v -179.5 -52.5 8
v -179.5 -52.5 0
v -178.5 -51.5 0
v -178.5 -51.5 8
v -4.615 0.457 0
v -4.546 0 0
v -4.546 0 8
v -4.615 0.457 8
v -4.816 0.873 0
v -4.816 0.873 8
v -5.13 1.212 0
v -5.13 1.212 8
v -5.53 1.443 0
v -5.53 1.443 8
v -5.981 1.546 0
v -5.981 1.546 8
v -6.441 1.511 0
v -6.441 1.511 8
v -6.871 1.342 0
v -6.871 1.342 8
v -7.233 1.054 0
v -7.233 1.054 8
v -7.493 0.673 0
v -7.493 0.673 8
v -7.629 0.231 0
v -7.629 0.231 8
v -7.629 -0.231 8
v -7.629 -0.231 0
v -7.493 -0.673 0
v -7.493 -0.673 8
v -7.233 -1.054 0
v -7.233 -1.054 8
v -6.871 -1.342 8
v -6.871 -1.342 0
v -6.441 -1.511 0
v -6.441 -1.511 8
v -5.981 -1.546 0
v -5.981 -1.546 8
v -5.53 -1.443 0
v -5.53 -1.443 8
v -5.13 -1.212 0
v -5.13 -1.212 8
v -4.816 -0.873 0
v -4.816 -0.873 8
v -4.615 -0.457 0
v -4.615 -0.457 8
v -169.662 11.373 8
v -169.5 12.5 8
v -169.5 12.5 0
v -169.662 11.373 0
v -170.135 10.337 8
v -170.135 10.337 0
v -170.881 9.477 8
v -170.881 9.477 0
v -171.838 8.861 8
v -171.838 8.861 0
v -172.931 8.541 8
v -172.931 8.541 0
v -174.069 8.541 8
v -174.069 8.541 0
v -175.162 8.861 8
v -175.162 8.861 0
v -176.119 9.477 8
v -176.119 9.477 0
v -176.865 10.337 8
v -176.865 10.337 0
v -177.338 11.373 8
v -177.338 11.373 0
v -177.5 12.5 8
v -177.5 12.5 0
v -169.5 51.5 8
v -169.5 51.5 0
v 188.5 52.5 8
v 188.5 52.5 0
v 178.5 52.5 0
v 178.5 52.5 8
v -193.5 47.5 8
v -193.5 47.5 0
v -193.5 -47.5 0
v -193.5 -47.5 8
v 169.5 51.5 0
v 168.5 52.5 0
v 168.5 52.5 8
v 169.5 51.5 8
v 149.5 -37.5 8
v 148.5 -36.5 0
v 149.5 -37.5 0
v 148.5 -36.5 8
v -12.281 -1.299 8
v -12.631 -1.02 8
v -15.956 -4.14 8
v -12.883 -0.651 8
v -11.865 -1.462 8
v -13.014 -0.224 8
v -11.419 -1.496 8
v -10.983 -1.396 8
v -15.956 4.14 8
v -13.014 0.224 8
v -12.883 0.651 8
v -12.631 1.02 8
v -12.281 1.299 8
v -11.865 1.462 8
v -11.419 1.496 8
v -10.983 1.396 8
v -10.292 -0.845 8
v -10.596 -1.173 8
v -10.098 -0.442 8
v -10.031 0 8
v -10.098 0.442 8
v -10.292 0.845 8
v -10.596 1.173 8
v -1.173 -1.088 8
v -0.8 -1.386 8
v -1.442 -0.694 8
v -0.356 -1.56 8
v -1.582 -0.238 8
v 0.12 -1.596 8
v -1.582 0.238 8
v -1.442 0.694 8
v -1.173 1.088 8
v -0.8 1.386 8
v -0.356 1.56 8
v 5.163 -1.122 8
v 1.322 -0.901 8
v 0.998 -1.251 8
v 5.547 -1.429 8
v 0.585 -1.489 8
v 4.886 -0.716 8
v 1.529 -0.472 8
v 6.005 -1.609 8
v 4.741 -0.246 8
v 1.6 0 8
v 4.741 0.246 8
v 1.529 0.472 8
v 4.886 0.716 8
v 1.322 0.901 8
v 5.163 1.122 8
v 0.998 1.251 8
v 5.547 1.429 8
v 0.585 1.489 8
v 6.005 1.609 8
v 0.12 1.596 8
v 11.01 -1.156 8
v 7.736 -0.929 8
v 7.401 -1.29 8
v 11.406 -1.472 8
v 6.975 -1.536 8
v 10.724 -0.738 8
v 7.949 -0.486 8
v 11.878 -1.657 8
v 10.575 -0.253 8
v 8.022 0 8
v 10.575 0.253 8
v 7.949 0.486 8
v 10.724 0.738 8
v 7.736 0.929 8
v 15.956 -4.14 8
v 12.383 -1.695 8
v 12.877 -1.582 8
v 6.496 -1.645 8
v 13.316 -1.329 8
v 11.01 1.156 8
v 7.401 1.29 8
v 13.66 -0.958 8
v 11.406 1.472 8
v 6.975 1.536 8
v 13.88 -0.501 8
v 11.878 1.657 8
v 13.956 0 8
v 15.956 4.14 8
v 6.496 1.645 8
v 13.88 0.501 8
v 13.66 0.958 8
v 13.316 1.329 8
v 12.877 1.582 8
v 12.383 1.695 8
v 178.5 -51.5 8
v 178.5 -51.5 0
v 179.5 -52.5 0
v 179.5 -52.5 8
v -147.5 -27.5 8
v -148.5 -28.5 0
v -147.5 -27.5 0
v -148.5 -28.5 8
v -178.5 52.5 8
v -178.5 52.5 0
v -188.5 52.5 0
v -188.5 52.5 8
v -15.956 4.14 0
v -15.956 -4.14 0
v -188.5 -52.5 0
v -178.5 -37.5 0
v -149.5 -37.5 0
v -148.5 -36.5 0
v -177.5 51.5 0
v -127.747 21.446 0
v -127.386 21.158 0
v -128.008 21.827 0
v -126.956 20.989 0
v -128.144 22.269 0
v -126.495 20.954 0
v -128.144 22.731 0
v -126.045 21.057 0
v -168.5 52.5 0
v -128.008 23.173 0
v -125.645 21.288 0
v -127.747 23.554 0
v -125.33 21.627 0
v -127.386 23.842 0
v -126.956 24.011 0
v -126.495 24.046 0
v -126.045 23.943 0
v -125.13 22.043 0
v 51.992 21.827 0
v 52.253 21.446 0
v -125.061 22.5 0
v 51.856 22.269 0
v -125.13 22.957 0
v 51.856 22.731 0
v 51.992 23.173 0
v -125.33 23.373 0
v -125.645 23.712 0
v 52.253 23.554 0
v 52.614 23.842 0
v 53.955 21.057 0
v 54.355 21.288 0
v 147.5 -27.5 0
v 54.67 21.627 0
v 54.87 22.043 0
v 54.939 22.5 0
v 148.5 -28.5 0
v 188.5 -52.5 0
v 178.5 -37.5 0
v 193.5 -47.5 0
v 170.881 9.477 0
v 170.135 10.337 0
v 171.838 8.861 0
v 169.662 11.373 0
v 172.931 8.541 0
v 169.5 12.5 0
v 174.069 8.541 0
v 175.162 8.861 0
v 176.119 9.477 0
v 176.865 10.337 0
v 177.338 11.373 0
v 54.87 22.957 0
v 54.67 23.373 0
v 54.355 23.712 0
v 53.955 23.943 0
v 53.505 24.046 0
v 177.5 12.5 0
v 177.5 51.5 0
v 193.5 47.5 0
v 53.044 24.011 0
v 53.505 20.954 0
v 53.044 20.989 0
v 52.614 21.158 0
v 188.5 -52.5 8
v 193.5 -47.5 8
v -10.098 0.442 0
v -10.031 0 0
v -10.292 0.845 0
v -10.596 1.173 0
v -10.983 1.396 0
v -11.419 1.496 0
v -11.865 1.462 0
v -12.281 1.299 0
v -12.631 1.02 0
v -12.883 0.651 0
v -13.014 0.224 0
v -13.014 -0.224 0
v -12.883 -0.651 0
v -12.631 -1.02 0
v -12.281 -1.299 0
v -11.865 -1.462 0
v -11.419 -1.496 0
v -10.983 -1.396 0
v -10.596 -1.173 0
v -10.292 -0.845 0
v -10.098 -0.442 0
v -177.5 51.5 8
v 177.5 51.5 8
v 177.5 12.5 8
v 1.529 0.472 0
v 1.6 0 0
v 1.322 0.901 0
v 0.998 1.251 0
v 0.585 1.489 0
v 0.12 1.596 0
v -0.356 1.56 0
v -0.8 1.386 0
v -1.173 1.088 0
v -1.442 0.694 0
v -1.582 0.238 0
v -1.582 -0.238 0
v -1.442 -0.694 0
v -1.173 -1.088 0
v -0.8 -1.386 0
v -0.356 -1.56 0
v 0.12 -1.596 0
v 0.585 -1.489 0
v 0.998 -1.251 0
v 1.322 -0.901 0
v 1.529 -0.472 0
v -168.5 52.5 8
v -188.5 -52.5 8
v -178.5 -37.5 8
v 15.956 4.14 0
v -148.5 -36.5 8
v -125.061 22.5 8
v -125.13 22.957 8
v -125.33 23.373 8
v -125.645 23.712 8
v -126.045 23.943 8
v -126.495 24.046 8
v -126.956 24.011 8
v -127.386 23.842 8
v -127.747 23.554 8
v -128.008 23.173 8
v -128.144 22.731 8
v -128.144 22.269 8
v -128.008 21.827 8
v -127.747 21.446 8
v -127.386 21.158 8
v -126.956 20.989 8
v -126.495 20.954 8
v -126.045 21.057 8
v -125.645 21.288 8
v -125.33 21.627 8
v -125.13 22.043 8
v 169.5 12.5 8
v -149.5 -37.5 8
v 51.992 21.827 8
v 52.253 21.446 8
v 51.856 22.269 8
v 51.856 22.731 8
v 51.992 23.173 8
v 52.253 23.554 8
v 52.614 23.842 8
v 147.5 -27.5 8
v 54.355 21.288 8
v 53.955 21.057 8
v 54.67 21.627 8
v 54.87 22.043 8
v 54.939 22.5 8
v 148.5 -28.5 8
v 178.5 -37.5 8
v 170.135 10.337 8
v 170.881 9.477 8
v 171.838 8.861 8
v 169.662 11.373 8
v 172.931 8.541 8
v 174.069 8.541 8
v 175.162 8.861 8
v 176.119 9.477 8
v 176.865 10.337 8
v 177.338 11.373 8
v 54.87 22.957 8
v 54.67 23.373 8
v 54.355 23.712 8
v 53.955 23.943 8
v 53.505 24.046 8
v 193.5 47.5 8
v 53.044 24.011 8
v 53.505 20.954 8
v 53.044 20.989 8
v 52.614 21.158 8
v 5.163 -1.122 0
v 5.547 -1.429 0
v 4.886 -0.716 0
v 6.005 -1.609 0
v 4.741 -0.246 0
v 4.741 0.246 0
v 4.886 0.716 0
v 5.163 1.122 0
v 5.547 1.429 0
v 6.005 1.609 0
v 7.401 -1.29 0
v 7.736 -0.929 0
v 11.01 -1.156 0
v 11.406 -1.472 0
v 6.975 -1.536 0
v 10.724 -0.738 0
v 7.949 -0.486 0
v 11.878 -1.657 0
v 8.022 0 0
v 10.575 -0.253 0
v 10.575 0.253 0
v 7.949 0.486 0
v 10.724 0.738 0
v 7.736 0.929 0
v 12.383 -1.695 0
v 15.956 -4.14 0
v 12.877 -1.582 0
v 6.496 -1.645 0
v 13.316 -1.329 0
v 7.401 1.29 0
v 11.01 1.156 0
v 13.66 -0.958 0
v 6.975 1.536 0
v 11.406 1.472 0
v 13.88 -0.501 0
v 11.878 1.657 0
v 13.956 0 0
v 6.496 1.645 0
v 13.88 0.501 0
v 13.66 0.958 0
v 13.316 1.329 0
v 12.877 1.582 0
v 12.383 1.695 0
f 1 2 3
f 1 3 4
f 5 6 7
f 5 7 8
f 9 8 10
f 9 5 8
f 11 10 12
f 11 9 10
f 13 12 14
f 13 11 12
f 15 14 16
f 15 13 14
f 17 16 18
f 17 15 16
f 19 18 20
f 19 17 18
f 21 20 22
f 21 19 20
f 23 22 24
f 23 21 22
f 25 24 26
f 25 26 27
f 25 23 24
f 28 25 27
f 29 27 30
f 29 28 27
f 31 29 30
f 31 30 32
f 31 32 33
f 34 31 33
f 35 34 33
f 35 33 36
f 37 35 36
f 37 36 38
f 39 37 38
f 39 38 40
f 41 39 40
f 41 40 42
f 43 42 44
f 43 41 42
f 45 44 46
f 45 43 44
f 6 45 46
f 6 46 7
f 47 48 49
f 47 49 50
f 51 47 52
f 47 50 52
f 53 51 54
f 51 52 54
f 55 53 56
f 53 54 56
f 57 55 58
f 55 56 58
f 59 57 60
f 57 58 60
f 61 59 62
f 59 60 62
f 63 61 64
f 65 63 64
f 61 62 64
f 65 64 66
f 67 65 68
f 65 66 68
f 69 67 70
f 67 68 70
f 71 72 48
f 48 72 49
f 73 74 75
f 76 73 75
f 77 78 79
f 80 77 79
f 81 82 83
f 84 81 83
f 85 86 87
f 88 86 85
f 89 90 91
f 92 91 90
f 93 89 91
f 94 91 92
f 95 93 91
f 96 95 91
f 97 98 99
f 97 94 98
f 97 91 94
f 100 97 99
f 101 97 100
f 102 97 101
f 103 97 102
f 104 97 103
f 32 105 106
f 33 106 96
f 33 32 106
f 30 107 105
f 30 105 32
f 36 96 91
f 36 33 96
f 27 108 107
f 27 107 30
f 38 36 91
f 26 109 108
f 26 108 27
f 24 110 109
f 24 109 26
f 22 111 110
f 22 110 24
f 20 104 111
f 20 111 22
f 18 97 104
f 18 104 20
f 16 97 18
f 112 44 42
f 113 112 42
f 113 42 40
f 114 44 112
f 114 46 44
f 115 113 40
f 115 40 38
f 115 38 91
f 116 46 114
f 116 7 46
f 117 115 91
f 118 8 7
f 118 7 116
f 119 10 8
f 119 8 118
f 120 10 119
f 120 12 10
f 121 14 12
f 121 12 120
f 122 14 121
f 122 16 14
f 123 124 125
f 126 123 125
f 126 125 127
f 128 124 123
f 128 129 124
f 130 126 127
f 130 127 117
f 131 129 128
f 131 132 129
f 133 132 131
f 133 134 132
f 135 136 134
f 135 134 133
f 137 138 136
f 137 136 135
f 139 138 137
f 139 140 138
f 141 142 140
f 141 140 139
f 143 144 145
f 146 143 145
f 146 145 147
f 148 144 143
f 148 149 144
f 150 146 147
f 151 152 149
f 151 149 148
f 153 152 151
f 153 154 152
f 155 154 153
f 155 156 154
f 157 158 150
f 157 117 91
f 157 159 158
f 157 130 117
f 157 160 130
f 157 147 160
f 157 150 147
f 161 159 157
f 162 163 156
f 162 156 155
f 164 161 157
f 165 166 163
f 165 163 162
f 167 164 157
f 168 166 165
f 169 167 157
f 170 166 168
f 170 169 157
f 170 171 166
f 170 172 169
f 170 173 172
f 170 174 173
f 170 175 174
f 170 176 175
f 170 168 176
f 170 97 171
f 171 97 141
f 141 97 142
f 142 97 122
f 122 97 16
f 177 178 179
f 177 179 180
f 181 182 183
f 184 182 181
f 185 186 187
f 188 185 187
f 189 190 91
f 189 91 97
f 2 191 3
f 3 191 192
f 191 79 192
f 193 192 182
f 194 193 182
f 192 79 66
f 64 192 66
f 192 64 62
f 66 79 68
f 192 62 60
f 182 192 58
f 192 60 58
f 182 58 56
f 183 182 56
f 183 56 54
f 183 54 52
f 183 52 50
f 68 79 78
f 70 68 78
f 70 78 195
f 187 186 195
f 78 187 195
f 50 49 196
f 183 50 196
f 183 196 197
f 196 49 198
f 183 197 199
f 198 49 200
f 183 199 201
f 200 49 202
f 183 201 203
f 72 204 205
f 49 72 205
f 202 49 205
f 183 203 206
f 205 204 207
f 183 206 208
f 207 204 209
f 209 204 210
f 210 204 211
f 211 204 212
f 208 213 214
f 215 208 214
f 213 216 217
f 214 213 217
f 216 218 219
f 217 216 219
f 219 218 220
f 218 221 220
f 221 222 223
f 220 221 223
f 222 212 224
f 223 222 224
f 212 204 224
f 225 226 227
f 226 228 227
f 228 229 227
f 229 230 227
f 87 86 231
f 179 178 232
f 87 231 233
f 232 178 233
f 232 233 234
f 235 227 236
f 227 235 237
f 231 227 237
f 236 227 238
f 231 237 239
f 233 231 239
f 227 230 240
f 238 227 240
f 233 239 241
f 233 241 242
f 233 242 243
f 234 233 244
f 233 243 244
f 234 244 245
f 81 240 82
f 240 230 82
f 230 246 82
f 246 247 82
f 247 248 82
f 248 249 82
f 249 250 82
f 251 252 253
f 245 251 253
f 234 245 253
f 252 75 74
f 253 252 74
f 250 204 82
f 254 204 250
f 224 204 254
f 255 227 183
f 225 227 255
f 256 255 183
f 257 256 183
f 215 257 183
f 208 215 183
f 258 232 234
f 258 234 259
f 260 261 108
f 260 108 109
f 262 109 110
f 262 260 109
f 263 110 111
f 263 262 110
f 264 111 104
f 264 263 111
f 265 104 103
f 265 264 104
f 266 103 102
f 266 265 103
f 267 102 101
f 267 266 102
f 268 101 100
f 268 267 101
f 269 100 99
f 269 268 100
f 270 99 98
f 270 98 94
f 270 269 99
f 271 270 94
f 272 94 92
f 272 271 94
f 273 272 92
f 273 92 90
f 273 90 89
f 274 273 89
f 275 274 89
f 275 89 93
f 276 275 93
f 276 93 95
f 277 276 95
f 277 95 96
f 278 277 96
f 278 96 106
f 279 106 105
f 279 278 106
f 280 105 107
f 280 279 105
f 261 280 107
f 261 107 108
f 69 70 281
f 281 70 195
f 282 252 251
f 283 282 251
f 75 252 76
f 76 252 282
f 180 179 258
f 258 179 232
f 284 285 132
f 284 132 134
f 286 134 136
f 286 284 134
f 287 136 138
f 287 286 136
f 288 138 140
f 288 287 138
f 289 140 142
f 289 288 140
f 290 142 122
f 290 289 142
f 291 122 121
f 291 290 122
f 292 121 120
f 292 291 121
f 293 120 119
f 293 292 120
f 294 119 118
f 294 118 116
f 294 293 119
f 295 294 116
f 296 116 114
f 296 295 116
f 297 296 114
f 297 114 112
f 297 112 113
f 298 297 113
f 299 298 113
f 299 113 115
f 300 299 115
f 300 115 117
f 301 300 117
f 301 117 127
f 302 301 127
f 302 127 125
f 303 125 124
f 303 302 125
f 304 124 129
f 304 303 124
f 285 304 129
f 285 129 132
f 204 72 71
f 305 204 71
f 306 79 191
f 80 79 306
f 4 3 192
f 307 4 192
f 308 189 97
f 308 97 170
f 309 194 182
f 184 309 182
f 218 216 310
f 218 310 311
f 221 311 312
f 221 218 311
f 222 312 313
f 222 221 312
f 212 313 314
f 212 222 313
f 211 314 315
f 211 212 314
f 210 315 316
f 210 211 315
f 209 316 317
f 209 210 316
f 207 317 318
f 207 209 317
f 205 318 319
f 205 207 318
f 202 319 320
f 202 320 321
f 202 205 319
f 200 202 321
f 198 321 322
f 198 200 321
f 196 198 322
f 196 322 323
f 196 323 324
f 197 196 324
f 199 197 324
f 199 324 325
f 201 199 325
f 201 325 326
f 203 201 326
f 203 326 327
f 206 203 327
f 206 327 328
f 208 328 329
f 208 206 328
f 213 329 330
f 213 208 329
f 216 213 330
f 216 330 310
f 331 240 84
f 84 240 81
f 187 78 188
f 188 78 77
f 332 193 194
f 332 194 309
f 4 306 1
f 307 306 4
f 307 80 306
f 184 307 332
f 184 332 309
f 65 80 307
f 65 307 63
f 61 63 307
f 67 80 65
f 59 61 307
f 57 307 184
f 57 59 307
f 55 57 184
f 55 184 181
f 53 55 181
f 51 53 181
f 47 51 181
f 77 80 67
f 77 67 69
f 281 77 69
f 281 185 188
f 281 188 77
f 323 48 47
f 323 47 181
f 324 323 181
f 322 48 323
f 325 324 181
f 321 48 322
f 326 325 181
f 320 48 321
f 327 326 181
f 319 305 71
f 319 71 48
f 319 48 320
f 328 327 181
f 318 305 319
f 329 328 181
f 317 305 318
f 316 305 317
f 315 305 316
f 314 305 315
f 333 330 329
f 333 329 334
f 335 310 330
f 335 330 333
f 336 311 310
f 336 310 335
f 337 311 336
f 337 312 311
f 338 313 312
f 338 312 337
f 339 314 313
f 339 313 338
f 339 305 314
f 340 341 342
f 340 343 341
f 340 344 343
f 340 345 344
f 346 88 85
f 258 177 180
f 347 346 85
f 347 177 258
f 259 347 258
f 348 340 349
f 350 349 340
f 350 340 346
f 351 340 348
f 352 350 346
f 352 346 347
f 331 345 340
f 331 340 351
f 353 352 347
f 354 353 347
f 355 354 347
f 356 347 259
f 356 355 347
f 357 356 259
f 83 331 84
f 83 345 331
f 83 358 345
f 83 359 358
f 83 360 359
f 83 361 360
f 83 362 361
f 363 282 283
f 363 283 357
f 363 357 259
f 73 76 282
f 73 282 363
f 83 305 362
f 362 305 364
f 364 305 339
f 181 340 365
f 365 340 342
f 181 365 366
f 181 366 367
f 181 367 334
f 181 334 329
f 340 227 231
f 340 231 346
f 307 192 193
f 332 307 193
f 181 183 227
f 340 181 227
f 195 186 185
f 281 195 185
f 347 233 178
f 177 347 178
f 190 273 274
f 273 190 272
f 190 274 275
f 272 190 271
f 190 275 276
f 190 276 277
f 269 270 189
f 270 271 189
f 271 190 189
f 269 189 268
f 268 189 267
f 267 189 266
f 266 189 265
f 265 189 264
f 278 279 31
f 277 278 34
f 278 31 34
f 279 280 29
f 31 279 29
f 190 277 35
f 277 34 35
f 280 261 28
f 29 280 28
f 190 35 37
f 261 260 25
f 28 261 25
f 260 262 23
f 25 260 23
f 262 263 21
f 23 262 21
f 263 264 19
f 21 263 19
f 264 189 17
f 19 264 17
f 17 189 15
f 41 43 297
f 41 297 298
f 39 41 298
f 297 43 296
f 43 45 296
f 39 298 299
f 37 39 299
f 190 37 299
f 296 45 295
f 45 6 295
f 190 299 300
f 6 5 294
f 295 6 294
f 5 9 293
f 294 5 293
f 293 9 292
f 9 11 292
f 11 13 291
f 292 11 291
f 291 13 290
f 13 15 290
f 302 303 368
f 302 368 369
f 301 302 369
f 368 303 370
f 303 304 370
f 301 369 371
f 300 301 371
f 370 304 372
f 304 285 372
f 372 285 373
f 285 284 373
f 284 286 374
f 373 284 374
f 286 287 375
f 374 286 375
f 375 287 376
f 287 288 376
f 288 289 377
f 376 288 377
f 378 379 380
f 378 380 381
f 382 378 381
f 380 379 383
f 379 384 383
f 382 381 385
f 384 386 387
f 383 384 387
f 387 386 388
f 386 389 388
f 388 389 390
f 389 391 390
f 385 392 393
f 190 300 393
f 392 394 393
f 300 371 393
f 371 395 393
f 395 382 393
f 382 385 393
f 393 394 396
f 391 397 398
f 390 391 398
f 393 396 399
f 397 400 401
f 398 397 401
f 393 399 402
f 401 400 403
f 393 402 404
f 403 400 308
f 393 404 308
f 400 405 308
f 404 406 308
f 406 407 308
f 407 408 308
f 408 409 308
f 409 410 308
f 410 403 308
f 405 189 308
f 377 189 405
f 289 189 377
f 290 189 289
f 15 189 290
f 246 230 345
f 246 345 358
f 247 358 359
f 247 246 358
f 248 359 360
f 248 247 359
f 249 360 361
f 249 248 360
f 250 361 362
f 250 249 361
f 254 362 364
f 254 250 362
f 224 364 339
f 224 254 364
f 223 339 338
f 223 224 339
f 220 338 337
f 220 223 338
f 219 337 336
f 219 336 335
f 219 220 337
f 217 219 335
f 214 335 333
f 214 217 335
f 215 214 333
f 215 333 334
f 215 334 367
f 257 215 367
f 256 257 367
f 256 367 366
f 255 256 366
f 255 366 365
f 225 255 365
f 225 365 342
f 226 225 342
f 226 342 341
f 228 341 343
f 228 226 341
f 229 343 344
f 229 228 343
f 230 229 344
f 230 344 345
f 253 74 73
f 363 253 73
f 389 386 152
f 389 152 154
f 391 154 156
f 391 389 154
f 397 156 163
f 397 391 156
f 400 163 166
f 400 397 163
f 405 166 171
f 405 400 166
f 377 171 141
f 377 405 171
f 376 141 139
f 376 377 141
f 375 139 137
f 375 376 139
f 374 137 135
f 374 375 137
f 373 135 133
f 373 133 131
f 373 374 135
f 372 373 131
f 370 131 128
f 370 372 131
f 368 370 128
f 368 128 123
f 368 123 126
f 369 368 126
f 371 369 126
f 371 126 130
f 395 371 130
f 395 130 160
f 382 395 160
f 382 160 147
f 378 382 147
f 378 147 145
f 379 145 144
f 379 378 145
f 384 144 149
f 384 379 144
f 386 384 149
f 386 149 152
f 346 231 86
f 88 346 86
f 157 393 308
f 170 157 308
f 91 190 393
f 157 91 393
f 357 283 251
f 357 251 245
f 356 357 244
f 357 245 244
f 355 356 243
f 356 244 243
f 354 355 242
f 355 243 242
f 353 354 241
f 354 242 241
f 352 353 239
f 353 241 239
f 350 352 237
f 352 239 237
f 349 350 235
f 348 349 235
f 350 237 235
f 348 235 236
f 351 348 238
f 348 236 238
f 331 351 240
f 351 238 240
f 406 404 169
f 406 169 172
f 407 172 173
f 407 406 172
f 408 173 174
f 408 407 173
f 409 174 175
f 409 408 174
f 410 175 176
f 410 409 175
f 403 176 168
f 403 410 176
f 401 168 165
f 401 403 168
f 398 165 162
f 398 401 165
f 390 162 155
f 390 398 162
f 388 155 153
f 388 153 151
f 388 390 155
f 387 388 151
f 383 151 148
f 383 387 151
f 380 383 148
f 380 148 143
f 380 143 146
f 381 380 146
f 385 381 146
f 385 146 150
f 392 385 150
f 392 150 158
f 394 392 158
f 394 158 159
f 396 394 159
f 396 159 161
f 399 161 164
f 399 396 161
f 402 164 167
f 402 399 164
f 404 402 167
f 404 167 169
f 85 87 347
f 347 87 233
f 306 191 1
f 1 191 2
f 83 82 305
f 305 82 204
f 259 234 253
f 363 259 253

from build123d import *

# Parameters (mm, degrees)
F0_R     = 1.55
F1_DEPTH = 8
F2_SIZE  = 5
F3_W     = 31.912242
F3_H     = 8.279254
F3_R     = 1.5
F3_R_2   = 1.55
F3_R_3   = 1.6
F3_R_4   = 1.65
F3_R_5   = 1.7
F4_DEPTH = 8
F5_SIZE  = 1


with BuildPart() as f1:
    # F0 (on Top) → F1 (new body)
    with BuildSketch(Plane.XY):
        with BuildLine():
            Line((193.5, -52.5), (193.5, 52.5))
            Line((193.5, 52.5), (177.5, 52.5))
            Line((177.5, 52.5), (177.5, 12.5))
            ThreePointArc((177.5, 12.5), (173.5, 8.5), (169.5, 12.5))
            Line((169.5, 12.5), (169.5, 52.5))
            Line((169.5, 52.5), (-169.5, 52.5))
            Line((-169.5, 52.5), (-169.5, 12.5))
            ThreePointArc((-169.5, 12.5), (-173.5, 8.5), (-177.5, 12.5))
            Line((-177.5, 12.5), (-177.5, 52.5))
            Line((-177.5, 52.5), (-193.5, 52.5))
            Line((-193.5, 52.5), (-193.5, -52.5))
            Line((-193.5, -52.5), (-178.5, -52.5))
            Line((-178.5, -52.5), (-178.5, -37.5))
            Line((-178.5, -37.5), (-148.5, -37.5))
            Line((-148.5, -37.5), (-148.5, -27.5))
            Line((-148.5, -27.5), (148.5, -27.5))
            Line((148.5, -27.5), (148.5, -37.5))
            Line((148.5, -37.5), (178.5, -37.5))
            Line((178.5, -37.5), (178.5, -52.5))
            Line((178.5, -52.5), (193.5, -52.5))
        make_face()
        with Locations((-126.611084, 22.5)):
            Circle(F0_R, mode=Mode.SUBTRACT)
        with Locations((53.388916, 22.5)):
            Circle(F0_R, mode=Mode.SUBTRACT)
    extrude(amount=F1_DEPTH)

    # F2
    f2_edges = [f1.edges().sort_by_distance(p)[0] for p in [
        (-193.5, 52.5, 4),
        (-193.5, -52.5, 4),
        (193.5, -52.5, 4),
        (193.5, 52.5, 4),
    ]]
    chamfer(f2_edges, length=F2_SIZE)

    # F5
    f5_edges = [f1.edges().sort_by_distance(p)[0] for p in [
        (-178.5, -52.5, 4),
        (178.5, -52.5, 4),
        (177.5, 52.5, 4),
        (169.5, 52.5, 4),
        (-177.5, 52.5, 4),
        (-169.5, 52.5, 4),
        (-148.5, -27.5, 4),
        (148.5, -27.5, 4),
        (148.5, -37.5, 4),
        (-148.5, -37.5, 4),
    ]]
    chamfer(f5_edges, length=F5_SIZE)


with BuildPart() as f4:
    # F3 (on Top) → F4 (new body)
    with BuildSketch(Plane.XY):
        Rectangle(F3_W, F3_H)
        with Locations((-11.531136, 0)):
            Circle(F3_R, mode=Mode.SUBTRACT)
        with Locations((-6.096364, 0)):
            Circle(F3_R_2, mode=Mode.SUBTRACT)
        Circle(F3_R_3, mode=Mode.SUBTRACT)
        with Locations((6.37244, 0)):
            Circle(F3_R_4, mode=Mode.SUBTRACT)
        with Locations((12.255835, 0)):
            Circle(F3_R_5, mode=Mode.SUBTRACT)
    extrude(amount=F4_DEPTH)


solid = Compound([f1.part, f4.part])
